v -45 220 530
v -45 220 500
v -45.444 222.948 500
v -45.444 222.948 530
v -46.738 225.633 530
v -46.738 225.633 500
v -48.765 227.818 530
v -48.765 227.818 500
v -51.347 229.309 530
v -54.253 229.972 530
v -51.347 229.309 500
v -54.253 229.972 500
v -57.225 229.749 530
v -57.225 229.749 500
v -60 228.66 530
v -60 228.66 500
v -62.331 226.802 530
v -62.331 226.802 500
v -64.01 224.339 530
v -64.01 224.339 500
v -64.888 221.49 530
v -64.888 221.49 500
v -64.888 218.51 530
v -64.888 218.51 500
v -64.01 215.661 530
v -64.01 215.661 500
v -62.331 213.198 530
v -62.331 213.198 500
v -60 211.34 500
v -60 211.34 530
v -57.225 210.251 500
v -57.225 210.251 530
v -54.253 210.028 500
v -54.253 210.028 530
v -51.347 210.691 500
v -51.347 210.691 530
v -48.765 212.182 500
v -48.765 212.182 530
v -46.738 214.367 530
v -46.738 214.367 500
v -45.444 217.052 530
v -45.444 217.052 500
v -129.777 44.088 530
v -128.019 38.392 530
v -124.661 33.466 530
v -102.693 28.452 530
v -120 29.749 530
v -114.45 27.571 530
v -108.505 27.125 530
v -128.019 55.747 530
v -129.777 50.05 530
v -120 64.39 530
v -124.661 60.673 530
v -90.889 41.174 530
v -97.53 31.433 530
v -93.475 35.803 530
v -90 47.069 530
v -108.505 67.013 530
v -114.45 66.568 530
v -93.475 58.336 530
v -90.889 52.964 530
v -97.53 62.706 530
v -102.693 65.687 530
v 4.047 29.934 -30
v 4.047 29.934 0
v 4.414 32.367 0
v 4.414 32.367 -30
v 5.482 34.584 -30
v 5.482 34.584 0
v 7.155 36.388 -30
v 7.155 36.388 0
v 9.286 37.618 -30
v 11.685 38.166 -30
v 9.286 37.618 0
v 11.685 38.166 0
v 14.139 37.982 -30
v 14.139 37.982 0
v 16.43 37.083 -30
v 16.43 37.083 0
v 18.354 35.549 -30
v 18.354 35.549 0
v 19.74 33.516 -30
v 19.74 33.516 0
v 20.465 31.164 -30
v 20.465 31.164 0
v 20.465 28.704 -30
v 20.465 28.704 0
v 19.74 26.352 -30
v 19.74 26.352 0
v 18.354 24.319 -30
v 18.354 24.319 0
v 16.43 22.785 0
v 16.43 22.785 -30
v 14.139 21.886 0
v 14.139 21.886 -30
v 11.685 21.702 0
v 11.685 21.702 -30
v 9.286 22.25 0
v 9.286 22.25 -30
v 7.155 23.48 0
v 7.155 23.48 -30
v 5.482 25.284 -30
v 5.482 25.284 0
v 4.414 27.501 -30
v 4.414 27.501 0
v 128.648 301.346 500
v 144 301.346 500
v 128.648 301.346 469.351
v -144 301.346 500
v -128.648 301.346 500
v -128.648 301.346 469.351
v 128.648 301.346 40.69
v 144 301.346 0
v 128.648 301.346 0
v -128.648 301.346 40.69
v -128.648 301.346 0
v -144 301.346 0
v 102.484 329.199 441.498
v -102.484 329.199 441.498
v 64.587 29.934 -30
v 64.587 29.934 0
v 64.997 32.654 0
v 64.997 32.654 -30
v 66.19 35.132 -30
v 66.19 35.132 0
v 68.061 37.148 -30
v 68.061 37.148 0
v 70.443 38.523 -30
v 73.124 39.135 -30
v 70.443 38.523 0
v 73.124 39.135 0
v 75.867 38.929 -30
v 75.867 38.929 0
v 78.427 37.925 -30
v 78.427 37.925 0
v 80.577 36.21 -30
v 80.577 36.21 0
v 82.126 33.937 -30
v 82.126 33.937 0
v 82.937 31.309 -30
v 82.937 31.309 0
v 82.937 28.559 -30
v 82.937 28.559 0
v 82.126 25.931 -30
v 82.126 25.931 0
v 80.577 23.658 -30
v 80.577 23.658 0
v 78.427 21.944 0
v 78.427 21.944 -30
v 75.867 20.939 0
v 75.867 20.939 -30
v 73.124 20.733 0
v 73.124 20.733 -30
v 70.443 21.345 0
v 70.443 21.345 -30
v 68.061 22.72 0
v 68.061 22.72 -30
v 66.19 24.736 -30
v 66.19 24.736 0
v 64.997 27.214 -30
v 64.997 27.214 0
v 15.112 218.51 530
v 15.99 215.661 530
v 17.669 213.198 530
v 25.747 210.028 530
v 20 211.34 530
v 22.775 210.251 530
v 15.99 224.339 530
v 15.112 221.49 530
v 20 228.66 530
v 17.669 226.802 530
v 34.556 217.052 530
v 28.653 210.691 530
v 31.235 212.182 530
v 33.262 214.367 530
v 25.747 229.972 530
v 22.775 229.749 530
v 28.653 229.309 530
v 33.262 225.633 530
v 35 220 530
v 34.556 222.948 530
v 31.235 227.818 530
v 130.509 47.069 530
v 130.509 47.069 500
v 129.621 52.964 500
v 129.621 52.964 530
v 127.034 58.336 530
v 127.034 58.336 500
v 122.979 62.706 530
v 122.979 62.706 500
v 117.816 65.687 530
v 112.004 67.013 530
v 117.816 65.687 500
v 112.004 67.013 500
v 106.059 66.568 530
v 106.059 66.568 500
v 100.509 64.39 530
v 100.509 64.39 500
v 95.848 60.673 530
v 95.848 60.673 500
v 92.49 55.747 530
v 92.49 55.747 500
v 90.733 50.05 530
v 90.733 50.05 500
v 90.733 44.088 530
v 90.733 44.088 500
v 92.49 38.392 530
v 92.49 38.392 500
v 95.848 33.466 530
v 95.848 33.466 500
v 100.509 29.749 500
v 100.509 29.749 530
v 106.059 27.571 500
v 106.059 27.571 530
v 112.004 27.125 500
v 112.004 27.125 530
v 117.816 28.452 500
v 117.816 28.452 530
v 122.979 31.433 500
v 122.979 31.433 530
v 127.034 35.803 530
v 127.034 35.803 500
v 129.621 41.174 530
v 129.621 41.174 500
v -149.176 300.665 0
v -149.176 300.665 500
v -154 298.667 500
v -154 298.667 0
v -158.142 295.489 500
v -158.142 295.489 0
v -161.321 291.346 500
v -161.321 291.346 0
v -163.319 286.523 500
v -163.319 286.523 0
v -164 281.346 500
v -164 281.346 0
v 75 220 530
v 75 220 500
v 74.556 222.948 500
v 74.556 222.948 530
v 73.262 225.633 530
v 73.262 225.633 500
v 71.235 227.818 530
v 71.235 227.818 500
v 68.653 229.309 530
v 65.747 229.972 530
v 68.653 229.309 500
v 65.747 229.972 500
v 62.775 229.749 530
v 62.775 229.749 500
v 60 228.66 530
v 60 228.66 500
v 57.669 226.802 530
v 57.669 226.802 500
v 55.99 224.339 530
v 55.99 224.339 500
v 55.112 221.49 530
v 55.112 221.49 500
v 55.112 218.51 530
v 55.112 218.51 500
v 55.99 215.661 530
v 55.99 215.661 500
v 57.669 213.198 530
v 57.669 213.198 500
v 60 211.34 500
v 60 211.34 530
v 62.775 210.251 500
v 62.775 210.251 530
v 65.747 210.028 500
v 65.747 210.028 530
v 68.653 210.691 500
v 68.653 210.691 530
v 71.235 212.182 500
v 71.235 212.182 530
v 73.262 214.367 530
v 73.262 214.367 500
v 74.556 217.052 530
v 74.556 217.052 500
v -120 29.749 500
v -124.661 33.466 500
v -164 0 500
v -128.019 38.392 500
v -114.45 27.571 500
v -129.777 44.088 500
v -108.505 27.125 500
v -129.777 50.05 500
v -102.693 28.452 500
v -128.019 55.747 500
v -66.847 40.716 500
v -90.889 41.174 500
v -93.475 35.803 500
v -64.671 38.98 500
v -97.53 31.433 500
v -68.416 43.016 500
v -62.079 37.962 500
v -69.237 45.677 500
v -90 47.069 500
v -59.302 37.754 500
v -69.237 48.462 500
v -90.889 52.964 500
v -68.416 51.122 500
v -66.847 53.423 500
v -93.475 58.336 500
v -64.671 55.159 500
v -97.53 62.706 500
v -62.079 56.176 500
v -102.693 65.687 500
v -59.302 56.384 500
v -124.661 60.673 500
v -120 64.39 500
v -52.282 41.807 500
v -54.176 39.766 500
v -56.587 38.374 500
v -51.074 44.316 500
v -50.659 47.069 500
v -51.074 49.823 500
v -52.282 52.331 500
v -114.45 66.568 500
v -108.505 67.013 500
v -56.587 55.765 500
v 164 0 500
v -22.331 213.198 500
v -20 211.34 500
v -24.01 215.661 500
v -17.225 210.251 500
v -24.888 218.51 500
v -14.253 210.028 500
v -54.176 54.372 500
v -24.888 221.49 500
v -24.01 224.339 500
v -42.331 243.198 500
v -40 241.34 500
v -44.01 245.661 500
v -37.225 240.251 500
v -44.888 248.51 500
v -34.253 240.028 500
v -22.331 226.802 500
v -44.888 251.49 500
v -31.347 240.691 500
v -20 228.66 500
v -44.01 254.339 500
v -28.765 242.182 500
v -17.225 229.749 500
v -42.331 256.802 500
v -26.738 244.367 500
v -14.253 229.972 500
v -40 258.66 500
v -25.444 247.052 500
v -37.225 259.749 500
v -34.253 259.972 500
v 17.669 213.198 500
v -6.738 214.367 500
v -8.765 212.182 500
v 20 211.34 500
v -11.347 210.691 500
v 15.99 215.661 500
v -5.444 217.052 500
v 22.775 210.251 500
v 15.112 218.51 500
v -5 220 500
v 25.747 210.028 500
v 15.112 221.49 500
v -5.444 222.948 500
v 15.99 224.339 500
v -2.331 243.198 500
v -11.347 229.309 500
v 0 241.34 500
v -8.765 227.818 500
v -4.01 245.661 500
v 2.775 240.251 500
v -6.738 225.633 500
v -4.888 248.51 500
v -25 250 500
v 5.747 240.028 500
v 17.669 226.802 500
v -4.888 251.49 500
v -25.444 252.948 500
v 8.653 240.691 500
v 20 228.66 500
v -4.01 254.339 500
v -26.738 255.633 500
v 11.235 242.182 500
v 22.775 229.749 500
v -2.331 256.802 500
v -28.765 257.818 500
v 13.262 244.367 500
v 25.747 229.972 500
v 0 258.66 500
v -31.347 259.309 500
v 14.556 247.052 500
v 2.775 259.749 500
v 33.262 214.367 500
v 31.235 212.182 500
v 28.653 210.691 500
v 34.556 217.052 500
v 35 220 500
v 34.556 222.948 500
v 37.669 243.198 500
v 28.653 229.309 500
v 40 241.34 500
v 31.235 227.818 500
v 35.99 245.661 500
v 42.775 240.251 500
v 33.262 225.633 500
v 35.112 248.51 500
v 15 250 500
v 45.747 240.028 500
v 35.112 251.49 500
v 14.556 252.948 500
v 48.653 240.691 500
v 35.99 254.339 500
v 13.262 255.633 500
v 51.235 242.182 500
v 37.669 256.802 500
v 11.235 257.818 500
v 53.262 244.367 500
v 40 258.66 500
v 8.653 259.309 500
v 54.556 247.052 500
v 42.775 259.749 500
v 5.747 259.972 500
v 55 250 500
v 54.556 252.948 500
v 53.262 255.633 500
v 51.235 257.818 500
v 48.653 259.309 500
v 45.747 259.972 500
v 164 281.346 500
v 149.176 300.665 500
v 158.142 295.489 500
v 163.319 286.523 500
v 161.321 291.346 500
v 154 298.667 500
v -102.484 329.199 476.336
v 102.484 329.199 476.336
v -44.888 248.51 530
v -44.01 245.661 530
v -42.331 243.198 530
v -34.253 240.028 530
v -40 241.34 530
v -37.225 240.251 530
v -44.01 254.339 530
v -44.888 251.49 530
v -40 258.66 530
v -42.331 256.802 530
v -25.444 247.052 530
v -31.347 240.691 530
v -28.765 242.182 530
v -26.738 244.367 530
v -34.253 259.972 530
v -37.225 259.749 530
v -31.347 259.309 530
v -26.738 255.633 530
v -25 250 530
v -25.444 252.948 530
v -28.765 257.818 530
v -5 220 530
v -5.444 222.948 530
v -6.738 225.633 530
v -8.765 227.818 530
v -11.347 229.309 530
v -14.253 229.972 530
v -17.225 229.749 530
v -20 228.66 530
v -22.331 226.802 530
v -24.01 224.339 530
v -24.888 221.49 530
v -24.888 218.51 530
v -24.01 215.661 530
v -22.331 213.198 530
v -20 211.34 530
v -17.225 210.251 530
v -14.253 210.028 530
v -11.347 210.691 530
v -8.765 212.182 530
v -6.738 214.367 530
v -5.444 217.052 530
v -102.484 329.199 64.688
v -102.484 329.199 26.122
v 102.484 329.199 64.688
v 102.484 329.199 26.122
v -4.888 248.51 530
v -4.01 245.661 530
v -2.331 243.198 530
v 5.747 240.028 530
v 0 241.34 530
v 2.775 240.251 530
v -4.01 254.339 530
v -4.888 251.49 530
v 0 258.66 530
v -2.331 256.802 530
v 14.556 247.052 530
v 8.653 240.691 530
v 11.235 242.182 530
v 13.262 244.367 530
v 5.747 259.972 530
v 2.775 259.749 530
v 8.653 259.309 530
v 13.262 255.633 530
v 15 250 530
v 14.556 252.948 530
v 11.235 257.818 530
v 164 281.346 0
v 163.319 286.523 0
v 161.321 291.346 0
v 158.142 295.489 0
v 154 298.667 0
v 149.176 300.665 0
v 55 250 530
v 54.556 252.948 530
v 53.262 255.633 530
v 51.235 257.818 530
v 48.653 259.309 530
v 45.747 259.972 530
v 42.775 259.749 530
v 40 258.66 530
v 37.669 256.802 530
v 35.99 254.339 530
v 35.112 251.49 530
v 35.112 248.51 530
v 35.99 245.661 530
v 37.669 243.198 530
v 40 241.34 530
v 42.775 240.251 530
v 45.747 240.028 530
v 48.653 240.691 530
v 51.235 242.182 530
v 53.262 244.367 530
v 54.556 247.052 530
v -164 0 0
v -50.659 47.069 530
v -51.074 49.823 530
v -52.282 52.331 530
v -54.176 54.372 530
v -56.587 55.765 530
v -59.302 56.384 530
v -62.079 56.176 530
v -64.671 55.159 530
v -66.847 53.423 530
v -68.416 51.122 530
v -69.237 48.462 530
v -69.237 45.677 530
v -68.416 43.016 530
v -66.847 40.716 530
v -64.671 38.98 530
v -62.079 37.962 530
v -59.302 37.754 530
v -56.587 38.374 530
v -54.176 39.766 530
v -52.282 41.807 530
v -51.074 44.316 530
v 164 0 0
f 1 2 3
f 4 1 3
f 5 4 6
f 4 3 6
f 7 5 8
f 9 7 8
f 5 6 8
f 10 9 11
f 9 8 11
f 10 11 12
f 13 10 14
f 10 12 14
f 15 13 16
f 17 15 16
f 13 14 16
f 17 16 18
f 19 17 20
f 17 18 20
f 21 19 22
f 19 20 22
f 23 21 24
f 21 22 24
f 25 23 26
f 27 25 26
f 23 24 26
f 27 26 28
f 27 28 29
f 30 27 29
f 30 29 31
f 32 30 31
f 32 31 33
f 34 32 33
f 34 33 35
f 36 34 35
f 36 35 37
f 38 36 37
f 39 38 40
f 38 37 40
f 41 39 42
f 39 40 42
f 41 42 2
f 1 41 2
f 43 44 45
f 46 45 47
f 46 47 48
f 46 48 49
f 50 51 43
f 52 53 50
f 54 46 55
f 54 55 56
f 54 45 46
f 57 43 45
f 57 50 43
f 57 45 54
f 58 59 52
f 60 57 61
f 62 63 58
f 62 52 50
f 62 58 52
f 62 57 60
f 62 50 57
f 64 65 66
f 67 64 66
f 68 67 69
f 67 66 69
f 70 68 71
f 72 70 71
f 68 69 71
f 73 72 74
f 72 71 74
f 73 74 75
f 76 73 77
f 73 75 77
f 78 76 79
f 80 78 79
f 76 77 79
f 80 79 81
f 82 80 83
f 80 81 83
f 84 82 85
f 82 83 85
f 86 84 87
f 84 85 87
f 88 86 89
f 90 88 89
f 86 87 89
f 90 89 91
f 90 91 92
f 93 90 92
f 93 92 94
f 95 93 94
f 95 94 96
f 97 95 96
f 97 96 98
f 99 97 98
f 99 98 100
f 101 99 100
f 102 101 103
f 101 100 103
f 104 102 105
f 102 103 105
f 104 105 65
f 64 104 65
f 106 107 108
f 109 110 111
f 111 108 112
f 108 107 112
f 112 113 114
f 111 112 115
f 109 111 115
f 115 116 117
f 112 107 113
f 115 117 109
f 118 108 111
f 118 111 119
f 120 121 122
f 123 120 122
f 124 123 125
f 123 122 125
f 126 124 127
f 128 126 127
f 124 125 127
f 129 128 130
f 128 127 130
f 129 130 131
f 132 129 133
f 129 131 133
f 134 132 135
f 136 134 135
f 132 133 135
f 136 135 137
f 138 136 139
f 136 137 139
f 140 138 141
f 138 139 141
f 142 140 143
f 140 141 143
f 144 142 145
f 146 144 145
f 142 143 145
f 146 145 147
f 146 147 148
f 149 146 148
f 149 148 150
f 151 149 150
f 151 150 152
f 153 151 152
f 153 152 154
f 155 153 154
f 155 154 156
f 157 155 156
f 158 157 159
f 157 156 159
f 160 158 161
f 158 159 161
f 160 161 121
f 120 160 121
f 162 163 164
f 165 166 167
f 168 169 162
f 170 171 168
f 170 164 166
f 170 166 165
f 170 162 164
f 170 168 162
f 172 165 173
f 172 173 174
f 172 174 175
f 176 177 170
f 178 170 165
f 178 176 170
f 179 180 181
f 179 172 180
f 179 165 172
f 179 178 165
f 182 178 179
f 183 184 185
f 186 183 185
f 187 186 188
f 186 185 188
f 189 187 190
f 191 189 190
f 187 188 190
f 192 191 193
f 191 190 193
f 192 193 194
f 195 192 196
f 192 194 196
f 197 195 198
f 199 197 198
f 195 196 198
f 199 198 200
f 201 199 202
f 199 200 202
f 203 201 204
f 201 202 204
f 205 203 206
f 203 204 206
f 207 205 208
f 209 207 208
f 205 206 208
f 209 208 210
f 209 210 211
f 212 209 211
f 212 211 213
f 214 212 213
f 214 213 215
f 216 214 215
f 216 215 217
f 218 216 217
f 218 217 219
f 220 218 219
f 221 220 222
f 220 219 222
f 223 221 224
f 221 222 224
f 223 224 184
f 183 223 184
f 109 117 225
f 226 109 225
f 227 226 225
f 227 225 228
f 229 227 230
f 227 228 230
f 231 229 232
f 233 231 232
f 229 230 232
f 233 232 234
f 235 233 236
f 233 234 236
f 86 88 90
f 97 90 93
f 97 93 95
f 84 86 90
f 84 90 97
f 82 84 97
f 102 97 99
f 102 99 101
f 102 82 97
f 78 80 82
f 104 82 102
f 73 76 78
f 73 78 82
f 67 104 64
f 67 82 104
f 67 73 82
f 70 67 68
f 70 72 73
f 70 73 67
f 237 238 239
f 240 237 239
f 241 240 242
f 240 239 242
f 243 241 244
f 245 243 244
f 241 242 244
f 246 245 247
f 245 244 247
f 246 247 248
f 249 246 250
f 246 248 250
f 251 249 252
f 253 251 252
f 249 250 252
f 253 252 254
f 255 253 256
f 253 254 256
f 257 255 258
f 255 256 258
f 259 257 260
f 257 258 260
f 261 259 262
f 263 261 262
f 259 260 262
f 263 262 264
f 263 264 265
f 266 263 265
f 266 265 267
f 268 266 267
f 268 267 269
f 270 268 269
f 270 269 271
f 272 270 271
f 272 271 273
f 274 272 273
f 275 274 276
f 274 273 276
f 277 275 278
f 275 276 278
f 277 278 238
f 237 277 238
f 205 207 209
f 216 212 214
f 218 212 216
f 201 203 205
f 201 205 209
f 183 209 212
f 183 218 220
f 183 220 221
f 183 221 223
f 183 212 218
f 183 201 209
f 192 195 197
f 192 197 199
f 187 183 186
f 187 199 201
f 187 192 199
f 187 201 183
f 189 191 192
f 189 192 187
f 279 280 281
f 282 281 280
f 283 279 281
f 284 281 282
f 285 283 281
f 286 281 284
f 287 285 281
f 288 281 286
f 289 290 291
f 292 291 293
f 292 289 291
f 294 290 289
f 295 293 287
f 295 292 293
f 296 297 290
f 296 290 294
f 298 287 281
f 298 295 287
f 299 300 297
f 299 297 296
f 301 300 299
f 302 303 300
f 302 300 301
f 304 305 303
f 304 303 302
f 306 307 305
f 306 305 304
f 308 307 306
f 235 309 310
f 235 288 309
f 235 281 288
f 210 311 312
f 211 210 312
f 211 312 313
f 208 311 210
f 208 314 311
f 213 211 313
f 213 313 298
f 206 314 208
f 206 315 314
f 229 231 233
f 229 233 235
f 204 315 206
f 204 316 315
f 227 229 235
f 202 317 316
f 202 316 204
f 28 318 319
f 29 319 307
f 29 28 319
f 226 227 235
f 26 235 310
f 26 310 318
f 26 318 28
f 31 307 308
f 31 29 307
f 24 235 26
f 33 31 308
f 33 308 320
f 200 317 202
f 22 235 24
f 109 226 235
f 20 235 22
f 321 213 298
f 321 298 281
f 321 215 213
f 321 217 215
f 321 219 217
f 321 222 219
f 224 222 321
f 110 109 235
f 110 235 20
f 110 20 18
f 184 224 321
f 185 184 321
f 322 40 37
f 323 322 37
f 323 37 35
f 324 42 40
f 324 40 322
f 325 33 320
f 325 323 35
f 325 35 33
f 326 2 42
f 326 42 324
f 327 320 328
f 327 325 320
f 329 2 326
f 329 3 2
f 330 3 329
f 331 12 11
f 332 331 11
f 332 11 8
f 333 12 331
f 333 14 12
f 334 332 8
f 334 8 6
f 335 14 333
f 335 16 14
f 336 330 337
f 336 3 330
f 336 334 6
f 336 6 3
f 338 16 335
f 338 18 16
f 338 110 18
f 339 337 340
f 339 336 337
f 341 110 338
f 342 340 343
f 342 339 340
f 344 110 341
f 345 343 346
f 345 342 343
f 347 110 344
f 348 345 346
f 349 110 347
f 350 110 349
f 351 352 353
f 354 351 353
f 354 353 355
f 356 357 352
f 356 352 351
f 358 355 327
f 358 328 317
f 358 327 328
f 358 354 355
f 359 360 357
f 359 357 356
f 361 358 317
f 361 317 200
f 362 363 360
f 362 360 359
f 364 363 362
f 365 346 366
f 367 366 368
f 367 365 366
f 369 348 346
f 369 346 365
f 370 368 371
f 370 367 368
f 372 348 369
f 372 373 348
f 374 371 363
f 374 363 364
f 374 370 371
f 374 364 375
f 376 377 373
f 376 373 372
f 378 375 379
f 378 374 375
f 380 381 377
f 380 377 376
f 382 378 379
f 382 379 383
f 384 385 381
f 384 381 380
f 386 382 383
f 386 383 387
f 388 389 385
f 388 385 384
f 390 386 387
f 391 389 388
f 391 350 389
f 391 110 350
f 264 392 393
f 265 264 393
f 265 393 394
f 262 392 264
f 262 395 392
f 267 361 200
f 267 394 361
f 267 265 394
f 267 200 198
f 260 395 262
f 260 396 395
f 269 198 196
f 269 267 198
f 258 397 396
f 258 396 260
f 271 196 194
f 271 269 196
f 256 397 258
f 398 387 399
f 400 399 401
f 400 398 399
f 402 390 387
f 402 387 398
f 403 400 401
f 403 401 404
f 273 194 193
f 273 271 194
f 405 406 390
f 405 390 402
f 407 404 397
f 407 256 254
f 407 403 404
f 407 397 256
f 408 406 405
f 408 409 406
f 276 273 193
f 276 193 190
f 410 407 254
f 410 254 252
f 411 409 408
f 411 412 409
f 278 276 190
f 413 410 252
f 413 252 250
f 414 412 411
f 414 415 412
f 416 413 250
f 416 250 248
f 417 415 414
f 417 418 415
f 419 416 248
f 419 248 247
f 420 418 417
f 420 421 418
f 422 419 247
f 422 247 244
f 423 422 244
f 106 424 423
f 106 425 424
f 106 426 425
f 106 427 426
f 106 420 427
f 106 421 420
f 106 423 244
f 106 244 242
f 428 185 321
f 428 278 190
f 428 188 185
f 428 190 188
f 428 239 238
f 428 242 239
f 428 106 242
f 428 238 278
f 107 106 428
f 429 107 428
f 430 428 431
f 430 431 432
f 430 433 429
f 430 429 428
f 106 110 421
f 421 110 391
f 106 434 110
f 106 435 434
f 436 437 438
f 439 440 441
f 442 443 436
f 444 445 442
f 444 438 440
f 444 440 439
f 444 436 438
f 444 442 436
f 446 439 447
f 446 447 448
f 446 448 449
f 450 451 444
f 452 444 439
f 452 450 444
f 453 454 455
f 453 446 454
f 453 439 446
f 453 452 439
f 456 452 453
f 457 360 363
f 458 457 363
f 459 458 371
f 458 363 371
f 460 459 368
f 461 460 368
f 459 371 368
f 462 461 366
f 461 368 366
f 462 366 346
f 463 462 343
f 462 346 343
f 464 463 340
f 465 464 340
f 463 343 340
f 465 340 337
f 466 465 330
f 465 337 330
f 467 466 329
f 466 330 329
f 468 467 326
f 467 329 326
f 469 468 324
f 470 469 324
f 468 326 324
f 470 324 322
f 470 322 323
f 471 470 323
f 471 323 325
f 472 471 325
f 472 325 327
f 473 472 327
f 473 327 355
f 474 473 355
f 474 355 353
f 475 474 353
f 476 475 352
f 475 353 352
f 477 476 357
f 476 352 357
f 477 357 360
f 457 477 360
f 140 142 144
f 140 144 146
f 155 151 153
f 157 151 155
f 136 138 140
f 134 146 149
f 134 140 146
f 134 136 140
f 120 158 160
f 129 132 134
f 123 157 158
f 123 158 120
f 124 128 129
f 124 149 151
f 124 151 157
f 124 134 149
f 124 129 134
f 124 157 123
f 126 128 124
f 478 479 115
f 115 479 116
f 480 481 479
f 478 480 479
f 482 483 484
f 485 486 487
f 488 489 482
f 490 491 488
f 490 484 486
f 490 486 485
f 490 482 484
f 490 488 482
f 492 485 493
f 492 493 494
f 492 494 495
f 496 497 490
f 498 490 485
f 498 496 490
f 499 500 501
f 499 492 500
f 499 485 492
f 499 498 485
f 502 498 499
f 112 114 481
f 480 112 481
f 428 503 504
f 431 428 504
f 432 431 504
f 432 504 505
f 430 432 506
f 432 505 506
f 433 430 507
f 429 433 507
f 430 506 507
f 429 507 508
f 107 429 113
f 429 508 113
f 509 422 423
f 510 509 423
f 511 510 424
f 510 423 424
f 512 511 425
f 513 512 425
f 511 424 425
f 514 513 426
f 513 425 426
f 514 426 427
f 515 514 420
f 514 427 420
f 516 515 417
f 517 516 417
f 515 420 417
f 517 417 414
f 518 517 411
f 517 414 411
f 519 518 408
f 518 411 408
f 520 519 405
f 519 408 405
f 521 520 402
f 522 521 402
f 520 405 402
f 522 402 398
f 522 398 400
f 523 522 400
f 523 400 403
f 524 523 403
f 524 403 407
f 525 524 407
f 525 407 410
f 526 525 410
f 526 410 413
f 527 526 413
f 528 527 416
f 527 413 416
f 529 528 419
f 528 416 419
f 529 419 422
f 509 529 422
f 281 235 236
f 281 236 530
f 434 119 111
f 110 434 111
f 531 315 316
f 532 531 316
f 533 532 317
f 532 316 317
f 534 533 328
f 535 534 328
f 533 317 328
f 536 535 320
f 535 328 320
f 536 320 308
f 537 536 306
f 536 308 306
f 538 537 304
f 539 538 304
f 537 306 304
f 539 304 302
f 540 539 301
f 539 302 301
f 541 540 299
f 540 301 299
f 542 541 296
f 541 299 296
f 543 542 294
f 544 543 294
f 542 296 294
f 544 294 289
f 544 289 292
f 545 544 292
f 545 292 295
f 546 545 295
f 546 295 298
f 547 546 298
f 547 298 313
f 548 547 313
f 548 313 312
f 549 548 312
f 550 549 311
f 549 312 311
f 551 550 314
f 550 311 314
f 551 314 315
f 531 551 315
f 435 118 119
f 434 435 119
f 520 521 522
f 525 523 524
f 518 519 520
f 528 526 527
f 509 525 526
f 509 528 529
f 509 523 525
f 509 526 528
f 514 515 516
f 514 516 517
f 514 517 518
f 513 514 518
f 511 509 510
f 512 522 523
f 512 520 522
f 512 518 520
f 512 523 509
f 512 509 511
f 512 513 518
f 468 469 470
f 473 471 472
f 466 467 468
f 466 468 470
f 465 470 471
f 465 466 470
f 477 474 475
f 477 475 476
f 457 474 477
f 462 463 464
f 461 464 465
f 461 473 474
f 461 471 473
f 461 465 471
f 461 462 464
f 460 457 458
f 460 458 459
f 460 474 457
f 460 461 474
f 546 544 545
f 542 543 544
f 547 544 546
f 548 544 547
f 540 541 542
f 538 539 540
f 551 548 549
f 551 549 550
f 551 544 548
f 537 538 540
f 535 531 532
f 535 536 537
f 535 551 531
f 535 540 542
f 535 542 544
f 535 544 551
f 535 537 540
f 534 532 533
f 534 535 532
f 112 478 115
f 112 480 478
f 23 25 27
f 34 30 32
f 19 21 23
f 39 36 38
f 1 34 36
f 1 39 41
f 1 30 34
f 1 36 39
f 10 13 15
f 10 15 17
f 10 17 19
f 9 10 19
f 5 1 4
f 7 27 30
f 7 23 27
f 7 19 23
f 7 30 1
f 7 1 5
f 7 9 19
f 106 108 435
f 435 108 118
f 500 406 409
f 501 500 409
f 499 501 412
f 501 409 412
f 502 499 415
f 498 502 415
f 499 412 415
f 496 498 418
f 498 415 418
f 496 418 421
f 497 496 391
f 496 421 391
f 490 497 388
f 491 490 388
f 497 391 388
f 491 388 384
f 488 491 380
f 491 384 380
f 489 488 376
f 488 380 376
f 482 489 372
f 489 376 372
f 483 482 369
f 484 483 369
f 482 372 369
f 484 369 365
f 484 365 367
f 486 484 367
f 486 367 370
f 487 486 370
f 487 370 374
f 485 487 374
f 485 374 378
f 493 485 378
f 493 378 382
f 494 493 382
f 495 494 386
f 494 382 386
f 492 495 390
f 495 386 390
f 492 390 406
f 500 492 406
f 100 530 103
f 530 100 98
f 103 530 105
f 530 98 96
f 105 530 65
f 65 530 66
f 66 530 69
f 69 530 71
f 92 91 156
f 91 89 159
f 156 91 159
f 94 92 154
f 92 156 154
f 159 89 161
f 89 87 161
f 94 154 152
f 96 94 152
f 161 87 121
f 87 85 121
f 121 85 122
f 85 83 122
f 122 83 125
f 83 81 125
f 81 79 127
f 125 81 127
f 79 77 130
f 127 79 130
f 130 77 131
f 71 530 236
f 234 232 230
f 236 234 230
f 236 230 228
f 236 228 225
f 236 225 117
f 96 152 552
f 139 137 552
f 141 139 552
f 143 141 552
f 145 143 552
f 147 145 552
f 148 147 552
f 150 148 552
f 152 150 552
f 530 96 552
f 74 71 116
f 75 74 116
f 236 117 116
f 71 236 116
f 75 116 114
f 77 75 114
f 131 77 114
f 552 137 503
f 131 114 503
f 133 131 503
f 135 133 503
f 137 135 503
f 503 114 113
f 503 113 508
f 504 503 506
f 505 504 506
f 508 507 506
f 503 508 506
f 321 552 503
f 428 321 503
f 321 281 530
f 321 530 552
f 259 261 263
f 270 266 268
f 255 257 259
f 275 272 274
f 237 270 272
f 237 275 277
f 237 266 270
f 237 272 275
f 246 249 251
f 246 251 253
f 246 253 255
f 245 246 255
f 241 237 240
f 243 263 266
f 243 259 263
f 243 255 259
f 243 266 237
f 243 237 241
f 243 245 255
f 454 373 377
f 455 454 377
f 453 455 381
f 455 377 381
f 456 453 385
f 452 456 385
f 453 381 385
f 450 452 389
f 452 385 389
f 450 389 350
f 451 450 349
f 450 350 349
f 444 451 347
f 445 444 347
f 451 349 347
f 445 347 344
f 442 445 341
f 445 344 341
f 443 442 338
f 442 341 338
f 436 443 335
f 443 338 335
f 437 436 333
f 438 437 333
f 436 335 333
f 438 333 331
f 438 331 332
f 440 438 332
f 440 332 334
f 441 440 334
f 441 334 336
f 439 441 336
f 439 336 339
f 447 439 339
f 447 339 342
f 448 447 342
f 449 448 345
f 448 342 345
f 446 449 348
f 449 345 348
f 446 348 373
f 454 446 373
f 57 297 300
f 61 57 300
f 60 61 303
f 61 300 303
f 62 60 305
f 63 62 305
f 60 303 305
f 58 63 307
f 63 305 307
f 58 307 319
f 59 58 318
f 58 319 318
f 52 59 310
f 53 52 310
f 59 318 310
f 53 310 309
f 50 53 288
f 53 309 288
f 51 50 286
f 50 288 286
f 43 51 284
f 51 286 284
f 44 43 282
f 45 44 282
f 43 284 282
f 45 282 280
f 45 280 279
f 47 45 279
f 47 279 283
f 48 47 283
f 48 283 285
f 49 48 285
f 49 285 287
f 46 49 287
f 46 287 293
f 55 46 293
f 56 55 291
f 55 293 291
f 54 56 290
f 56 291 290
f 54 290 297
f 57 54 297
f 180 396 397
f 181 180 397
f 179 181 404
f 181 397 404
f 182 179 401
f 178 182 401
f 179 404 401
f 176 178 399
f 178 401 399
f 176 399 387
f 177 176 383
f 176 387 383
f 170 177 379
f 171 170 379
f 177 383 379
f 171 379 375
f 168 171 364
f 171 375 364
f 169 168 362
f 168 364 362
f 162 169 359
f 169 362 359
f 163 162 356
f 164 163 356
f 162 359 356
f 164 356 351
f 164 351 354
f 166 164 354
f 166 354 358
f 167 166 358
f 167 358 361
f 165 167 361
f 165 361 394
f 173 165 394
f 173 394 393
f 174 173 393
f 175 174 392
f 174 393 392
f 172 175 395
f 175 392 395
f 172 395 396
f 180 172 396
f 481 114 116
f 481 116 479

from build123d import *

# Parameters (mm, degrees)
EXTRUDE_1_DEPTH     = 500
CUT_EXTRUDE_1_DEPTH = 165
SKETCH_4_R          = 20
SKETCH_4_R_2        = 9.341042427
SKETCH_4_R_3        = 10
EXTRUDE_2_DEPTH     = 30
SKETCH_5_R          = 8.254931616
SKETCH_5_R_2        = 9.226679221
EXTRUDE_3_DEPTH     = 30


with BuildPart() as part:
    # Эскиз2 → Бобышка-Вытянуть1 (new body)
    with BuildSketch(Plane.XY):
        with BuildLine():
            Line((-164, 0), (164, 0))
            Line((164, 0), (164, 281.346442364))
            ThreePointArc((164, 281.346442364), (158.142135624, 295.488577987), (144, 301.346442364))
            Line((144, 301.346442364), (128.648418925, 301.346442364))
            Line((128.648418925, 301.346442364), (102.483646542, 329.199264578))
            Line((102.483646542, 329.199264578), (-102.483646542, 329.199264578))
            Line((-102.483646542, 329.199264578), (-128.648418925, 301.346442364))
            Line((-128.648418925, 301.346442364), (-144, 301.346442364))
            ThreePointArc((-144, 301.346442364), (-158.142135624, 295.488577987), (-164, 281.346442364))
            Line((-164, 281.346442364), (-164, 0))
        make_face()
    extrude(amount=EXTRUDE_1_DEPTH)

    # Эскиз3 → Вырез-Вытянуть1 (cut, symmetric)
    with BuildSketch(Plane(origin=(0, 0, 0), x_dir=(0, 0, -1), z_dir=(1, 0, 0))):
        Polygon((-463.138471818, 344.733431976), (-500, 301.346442364), (-514.613262102, 301.346442364), (-514.613262102, 363.370856045), (0, 363.370856045), (0, 301.346442364), (-40.69019293, 344.733431976), (-73.527559146, 339.458620278), (-40.69019293, 301.346442364), (-469.350946507, 301.346442364), (-431.238768593, 339.458620278), align=None)
    extrude(amount=CUT_EXTRUDE_1_DEPTH, both=True, mode=Mode.SUBTRACT)

    # Эскиз4 → Бобышка-Вытянуть2 (add)
    with BuildSketch(Plane.XY.offset(500)):
        with Locations((-110, 47.069313646)):
            Circle(SKETCH_4_R)
        with Locations((-60, 47.069313646)):
            Circle(SKETCH_4_R_2)
        with Locations((110.509329497, 47.069313646)):
            Circle(SKETCH_4_R)
        with Locations((-35, 250)):
            Circle(SKETCH_4_R_3)
        with Locations((-55, 220)):
            Circle(SKETCH_4_R_3)
        with Locations((-15, 220)):
            Circle(SKETCH_4_R_3)
        with Locations((25, 220)):
            Circle(SKETCH_4_R_3)
        with Locations((65, 220)):
            Circle(SKETCH_4_R_3)
        with Locations((5, 250)):
            Circle(SKETCH_4_R_3)
        with Locations((45, 250)):
            Circle(SKETCH_4_R_3)
    extrude(amount=EXTRUDE_2_DEPTH)

    # Эскиз5 → Бобышка-Вытянуть3 (add)
    with BuildSketch(Plane(origin=(0, 0, 0), x_dir=(-1, 0, 0), z_dir=(0, 0, -1))):
        with Locations((-12.302238961, 29.934052236)):
            Circle(SKETCH_5_R)
        with Locations((-73.813433765, 29.934052236)):
            Circle(SKETCH_5_R_2)
    extrude(amount=EXTRUDE_3_DEPTH)


solid = part.part
